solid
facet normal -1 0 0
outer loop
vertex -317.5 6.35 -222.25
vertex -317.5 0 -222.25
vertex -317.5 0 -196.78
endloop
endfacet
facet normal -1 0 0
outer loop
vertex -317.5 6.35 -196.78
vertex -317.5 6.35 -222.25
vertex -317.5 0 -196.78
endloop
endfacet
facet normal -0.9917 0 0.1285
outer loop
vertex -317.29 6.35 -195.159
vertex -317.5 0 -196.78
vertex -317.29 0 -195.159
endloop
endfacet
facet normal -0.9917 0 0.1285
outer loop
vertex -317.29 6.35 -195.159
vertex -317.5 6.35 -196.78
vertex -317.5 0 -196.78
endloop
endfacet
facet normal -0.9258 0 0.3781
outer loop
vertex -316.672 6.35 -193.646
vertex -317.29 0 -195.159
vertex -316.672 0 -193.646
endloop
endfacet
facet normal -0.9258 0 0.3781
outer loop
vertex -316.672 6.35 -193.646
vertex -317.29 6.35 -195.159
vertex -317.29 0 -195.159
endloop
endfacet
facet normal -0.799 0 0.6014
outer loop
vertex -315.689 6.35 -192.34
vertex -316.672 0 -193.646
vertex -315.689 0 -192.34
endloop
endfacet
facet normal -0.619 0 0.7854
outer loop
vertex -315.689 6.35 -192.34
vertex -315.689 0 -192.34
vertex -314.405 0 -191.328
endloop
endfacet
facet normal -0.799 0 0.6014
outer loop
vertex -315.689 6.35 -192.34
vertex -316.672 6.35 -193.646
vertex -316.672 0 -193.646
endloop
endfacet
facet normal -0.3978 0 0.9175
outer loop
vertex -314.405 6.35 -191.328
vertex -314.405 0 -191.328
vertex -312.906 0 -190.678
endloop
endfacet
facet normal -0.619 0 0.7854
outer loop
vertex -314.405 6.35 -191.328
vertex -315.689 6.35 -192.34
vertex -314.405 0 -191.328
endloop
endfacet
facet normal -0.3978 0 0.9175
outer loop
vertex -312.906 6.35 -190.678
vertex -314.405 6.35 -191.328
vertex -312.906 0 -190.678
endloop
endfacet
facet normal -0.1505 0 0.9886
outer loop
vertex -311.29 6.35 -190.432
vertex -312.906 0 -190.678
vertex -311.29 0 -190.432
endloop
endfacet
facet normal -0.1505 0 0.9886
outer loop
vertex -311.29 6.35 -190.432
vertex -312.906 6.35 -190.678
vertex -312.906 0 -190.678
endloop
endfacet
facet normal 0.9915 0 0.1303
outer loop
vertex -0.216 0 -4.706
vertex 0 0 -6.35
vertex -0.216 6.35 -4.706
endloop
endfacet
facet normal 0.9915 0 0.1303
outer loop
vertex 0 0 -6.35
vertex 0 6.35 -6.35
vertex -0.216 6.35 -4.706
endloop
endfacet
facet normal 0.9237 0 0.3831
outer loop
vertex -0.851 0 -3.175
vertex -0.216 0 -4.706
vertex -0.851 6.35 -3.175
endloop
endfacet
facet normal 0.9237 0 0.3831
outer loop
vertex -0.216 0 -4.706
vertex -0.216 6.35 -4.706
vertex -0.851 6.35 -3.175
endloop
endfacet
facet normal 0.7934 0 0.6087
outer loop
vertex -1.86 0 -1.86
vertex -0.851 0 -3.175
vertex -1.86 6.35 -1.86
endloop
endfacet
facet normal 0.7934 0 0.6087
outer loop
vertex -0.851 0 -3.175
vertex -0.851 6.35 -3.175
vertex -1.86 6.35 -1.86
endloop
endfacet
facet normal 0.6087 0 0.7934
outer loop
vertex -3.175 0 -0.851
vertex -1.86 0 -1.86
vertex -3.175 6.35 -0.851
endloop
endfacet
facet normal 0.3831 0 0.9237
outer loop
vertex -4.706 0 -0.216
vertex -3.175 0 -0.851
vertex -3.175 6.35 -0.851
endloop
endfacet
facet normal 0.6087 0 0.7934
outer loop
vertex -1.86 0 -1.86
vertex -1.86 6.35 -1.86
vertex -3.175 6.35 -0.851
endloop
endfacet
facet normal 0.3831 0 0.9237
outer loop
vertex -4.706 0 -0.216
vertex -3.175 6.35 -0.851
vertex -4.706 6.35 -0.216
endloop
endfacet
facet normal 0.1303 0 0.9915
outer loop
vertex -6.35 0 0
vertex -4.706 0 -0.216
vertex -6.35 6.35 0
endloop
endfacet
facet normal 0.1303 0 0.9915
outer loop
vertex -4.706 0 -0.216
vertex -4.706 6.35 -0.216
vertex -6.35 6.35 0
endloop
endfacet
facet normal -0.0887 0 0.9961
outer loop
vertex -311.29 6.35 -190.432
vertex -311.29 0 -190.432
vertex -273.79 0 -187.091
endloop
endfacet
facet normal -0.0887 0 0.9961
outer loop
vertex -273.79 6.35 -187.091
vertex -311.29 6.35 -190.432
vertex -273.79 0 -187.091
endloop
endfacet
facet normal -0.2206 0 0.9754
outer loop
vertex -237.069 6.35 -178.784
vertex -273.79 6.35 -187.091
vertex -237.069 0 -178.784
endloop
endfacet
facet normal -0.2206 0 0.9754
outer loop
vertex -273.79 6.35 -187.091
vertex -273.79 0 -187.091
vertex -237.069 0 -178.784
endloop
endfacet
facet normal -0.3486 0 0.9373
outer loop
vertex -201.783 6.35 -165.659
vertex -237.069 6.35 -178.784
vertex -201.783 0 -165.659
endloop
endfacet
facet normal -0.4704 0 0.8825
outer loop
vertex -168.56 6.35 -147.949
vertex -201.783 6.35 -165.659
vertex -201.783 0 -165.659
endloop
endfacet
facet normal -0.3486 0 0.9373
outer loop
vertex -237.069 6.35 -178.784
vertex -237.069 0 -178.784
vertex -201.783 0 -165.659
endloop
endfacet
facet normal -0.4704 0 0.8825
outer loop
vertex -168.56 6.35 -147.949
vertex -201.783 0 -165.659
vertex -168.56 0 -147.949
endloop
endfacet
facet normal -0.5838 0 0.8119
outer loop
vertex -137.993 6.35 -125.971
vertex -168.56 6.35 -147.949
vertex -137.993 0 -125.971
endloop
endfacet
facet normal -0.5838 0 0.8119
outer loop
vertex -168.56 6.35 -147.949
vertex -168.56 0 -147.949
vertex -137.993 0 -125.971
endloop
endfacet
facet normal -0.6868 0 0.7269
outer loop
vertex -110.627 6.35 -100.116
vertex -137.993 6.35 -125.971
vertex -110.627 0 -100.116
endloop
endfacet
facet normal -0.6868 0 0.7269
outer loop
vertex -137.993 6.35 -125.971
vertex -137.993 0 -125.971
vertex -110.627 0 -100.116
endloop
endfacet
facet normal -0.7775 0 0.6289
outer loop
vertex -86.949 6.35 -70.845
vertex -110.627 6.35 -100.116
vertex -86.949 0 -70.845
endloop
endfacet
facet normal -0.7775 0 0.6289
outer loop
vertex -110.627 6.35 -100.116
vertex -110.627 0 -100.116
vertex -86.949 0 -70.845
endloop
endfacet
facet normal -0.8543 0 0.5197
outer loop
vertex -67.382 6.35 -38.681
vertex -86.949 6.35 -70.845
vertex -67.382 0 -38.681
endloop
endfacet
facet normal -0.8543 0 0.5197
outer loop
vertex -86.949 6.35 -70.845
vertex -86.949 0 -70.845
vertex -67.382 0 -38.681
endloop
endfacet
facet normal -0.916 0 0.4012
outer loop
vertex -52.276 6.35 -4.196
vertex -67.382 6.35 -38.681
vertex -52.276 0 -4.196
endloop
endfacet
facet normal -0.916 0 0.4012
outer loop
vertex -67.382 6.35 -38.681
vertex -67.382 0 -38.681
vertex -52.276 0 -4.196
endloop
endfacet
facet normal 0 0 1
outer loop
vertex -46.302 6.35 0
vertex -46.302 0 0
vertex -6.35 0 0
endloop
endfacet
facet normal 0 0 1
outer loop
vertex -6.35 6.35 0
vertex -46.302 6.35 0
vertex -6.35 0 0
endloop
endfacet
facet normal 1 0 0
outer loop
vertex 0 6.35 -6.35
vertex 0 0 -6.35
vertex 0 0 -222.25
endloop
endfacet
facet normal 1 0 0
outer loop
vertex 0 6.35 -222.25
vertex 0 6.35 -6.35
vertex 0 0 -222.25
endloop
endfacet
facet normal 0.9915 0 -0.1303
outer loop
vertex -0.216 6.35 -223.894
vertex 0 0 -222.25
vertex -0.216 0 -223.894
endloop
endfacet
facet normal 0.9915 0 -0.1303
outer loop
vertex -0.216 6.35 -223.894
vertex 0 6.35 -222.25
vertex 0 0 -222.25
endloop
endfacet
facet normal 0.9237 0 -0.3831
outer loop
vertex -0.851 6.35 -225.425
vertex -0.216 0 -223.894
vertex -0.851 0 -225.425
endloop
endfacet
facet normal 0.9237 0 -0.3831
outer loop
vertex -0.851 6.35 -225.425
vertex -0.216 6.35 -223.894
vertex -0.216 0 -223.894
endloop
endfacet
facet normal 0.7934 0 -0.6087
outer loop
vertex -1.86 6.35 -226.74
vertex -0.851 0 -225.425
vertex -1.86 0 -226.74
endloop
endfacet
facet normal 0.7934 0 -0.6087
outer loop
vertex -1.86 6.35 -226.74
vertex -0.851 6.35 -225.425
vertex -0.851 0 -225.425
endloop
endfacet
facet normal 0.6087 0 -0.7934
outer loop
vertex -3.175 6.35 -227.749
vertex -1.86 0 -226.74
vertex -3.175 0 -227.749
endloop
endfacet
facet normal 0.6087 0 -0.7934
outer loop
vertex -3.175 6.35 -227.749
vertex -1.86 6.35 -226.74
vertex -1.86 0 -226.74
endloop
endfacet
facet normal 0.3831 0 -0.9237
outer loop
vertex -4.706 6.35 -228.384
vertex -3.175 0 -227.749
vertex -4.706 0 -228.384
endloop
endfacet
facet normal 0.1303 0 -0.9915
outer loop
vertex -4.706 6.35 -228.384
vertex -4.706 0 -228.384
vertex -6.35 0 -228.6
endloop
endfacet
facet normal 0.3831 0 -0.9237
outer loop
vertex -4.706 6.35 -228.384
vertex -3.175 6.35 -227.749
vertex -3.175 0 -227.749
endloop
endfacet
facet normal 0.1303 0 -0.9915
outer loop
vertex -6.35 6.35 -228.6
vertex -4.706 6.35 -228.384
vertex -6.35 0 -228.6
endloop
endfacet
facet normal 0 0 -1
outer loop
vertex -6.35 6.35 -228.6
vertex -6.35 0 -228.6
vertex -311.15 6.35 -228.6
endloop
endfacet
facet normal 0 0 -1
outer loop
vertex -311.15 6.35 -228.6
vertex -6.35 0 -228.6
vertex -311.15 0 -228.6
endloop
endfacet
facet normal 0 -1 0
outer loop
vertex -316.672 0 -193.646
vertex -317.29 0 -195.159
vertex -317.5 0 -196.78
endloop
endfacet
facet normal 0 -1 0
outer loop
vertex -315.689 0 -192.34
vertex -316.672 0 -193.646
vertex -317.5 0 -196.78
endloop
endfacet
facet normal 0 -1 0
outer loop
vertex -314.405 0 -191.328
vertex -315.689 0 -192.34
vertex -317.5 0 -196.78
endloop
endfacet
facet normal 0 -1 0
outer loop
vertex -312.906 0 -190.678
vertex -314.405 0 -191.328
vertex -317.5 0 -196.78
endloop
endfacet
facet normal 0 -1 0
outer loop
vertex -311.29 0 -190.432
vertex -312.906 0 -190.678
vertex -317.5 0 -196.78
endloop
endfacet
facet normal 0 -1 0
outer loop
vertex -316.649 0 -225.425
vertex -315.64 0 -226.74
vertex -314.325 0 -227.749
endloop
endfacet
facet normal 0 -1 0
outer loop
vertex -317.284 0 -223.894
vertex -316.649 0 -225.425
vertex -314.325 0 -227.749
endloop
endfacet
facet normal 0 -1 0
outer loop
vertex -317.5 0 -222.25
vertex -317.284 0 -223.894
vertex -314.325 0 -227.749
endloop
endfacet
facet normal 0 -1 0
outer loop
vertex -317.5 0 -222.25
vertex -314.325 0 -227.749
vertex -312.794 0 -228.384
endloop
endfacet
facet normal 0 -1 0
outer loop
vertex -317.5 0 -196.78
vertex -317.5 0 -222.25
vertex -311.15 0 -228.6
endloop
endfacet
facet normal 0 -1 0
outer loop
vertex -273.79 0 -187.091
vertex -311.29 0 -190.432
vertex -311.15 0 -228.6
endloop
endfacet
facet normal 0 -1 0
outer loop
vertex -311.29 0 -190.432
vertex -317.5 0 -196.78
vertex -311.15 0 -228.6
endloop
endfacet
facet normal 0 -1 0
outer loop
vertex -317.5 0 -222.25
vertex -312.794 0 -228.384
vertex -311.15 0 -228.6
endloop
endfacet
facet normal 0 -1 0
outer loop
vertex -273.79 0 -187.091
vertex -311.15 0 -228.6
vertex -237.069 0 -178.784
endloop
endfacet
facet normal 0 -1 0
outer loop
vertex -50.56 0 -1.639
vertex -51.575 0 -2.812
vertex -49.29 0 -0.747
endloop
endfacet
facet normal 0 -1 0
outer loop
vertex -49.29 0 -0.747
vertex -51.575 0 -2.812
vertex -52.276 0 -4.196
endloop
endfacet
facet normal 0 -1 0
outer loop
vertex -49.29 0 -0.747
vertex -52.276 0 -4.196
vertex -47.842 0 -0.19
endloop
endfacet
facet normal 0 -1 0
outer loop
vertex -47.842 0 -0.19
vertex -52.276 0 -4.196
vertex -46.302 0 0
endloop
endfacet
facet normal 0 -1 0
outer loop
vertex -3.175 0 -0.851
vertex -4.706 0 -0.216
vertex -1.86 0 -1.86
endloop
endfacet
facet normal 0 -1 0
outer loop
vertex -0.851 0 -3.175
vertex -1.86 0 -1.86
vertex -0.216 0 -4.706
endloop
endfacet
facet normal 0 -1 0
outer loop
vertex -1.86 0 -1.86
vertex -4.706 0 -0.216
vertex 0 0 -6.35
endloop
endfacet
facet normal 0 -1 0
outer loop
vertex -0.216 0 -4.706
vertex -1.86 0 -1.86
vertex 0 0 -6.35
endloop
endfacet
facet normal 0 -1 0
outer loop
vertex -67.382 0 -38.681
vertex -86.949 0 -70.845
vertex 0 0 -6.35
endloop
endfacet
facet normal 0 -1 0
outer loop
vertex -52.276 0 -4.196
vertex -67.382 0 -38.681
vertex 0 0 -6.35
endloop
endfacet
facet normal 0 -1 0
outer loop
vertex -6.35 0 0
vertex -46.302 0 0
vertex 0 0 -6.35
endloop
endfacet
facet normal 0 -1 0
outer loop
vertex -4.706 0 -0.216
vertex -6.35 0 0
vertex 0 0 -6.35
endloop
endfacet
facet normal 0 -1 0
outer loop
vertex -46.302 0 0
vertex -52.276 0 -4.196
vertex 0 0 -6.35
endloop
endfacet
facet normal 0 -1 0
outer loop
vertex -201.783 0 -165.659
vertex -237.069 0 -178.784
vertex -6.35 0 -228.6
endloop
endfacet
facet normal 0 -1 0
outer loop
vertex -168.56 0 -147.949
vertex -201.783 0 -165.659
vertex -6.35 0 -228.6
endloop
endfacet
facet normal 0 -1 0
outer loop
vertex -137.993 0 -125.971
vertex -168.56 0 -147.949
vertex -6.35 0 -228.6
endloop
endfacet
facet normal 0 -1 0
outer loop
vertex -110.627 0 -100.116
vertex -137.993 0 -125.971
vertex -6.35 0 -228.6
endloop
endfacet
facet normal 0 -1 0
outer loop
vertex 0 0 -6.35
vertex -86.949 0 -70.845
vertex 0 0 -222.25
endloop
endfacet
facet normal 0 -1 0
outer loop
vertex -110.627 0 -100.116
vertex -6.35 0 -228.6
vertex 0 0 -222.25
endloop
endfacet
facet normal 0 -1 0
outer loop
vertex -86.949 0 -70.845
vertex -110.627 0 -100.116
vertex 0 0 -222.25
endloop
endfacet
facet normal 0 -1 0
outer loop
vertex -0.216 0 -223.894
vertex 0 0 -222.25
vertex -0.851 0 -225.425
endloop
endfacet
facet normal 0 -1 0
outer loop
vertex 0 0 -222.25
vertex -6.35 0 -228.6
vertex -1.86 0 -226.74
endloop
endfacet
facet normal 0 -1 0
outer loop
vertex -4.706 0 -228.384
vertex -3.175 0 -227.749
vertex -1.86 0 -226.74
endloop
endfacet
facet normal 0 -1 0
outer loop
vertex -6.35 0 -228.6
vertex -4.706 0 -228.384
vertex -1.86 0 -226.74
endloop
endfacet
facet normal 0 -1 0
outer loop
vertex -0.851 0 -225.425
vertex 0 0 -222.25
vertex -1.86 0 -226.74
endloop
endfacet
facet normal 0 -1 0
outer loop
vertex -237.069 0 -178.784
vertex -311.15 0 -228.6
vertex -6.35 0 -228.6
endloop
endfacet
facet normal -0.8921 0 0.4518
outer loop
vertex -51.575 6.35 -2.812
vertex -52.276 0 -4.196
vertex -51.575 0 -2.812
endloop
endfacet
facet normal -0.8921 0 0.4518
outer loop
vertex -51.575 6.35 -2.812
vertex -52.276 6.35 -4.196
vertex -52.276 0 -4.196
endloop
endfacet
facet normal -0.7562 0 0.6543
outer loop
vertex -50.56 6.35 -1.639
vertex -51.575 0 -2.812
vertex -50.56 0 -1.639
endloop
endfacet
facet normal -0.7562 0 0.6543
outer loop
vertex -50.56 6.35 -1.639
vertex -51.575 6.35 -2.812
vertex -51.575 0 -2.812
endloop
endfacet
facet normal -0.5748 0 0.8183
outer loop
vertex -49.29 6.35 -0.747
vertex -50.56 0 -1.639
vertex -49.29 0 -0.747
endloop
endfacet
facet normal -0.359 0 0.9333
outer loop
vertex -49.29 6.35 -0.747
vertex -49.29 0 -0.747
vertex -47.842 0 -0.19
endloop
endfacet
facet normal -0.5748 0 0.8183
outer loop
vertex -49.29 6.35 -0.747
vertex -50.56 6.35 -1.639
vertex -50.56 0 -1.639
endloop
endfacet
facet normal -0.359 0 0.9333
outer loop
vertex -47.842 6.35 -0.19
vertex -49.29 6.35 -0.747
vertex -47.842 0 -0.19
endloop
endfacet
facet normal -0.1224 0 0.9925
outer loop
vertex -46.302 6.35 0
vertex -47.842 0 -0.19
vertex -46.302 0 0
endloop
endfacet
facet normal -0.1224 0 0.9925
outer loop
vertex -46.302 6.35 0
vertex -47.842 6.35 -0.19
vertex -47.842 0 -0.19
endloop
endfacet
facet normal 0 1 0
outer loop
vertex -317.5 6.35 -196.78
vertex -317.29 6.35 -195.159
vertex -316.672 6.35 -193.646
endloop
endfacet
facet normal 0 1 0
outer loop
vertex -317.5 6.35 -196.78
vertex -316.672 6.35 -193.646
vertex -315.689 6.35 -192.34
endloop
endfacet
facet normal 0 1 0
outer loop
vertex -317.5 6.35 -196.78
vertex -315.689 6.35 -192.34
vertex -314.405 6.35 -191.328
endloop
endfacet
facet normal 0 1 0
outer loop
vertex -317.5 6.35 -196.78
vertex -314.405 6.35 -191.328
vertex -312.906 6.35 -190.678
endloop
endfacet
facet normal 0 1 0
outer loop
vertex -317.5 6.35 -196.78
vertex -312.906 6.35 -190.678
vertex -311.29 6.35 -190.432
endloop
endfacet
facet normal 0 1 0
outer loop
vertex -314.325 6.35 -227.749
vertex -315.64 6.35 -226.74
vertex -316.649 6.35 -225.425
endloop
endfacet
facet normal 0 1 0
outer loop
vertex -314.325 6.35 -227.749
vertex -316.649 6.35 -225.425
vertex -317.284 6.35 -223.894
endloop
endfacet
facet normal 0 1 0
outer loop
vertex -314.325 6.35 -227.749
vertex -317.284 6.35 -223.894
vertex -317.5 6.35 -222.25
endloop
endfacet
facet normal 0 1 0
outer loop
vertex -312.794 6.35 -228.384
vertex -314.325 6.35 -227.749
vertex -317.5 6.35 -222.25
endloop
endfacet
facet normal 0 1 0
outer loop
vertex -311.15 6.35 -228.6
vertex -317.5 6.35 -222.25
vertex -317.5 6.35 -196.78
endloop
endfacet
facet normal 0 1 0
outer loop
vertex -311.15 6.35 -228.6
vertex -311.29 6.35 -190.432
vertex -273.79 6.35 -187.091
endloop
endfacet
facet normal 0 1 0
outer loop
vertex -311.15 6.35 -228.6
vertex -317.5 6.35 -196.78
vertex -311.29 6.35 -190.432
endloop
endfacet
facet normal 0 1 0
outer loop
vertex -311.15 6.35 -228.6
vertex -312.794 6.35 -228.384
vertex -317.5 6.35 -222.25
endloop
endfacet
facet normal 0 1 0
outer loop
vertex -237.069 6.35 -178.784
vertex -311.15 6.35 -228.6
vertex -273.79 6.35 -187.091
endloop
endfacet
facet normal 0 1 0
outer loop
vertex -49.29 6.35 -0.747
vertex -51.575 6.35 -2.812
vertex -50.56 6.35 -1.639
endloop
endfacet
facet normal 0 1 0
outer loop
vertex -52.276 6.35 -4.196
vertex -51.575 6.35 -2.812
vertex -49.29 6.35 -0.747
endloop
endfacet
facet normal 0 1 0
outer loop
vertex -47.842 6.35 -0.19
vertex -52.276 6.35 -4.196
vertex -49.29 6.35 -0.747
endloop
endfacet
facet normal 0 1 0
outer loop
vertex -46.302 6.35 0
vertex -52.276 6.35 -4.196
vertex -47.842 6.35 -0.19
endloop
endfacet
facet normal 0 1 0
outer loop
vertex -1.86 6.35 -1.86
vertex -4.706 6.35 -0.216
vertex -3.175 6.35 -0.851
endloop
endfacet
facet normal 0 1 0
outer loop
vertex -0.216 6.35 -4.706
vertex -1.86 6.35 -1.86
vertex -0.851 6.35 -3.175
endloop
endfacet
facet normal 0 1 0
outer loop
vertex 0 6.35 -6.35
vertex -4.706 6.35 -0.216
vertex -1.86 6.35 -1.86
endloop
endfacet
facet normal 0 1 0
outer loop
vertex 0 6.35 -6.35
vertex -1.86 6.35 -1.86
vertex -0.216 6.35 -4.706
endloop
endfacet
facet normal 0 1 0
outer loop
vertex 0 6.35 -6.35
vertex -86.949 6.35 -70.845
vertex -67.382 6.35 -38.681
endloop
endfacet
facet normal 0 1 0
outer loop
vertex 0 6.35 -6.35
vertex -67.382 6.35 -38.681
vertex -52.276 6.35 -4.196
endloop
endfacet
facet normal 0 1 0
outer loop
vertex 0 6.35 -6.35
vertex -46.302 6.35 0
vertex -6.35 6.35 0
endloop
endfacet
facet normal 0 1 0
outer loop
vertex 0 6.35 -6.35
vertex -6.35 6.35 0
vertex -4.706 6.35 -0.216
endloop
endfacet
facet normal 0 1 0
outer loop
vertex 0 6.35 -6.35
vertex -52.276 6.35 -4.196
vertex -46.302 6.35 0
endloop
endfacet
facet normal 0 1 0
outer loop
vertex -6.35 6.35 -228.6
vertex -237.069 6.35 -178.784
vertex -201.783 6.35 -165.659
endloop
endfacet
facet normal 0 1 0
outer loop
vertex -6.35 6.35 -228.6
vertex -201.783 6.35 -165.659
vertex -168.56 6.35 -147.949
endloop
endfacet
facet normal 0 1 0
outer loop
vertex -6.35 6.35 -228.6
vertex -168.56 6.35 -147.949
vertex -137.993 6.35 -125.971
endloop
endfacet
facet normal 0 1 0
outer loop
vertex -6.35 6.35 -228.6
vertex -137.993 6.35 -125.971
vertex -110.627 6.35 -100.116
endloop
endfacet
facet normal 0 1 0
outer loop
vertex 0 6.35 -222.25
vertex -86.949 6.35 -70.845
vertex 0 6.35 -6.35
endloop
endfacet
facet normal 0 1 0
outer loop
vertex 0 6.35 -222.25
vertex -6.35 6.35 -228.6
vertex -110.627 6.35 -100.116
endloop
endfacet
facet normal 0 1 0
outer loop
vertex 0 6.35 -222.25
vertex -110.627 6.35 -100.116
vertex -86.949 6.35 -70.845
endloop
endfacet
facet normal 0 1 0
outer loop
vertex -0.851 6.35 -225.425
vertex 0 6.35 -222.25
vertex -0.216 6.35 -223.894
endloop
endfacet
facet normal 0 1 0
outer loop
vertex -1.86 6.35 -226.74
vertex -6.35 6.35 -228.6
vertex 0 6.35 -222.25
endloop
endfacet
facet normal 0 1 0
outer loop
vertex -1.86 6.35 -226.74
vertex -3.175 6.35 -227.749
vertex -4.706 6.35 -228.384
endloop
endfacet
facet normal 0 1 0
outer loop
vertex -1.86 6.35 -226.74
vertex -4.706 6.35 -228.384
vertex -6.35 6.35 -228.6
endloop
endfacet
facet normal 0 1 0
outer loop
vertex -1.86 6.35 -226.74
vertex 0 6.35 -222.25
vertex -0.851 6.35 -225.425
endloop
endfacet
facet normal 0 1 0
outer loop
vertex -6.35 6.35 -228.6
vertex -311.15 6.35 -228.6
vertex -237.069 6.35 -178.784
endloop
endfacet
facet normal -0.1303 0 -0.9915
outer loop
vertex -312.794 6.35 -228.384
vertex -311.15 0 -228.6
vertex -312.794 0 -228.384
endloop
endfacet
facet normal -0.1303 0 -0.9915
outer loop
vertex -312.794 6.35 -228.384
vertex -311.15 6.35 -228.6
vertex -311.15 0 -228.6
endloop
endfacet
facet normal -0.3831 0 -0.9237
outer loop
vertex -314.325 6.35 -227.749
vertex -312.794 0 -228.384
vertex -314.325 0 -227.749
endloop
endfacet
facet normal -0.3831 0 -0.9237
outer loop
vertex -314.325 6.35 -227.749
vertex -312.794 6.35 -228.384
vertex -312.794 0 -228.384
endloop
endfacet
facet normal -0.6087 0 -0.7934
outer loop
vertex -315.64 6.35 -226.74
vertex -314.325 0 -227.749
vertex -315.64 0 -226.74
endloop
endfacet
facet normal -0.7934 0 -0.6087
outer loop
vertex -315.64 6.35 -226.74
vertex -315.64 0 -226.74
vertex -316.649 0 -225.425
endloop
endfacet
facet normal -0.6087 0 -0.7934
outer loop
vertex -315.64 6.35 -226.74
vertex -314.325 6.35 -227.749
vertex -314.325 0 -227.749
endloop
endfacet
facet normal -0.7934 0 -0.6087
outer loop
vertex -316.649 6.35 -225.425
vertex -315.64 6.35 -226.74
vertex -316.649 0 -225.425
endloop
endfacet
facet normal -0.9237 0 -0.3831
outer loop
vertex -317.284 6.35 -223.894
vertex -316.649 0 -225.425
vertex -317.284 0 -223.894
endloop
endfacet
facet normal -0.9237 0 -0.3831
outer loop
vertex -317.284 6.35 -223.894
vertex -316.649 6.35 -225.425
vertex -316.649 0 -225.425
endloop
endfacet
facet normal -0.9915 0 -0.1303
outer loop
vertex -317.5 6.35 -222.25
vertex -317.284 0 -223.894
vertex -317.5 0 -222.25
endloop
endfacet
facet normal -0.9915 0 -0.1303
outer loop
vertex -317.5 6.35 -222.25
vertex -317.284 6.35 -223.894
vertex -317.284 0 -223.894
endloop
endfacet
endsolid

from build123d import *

# Parameters (mm, degrees)
BOSS_EXTRUDE1_DEPTH = 6.35
FILLET1_R           = 6.35


with BuildPart() as part:
    # Sketch1 → Boss-Extrude1 (new body)
    with BuildSketch(Plane(origin=(0, 0, 0), x_dir=(1, 0, 0), z_dir=(0, 1, 0))):
        with BuildLine():
            Line((0, 0), (0, 228.6))
            Line((0, 228.6), (-317.5, 228.6))
            Line((-317.5, 228.6), (-317.5, 190.5))
            ThreePointArc((-317.5, 190.5), (-153.625703663, 137.984014872), (-50.8, 0))
            Line((-50.8, 0), (0, 0))
        make_face()
    extrude(amount=BOSS_EXTRUDE1_DEPTH)

    # Fillet1
    fillet1_edges = [part.edges().sort_by_distance(p)[0] for p in [
        (-50.8, 3.175, 0),
        (-317.5, 3.175, -190.5),
        (-317.5, 3.175, -228.6),
        (0, 3.175, -228.6),
        (0, 3.175, 0),
    ]]
    fillet(fillet1_edges, radius=FILLET1_R)


solid = part.part
